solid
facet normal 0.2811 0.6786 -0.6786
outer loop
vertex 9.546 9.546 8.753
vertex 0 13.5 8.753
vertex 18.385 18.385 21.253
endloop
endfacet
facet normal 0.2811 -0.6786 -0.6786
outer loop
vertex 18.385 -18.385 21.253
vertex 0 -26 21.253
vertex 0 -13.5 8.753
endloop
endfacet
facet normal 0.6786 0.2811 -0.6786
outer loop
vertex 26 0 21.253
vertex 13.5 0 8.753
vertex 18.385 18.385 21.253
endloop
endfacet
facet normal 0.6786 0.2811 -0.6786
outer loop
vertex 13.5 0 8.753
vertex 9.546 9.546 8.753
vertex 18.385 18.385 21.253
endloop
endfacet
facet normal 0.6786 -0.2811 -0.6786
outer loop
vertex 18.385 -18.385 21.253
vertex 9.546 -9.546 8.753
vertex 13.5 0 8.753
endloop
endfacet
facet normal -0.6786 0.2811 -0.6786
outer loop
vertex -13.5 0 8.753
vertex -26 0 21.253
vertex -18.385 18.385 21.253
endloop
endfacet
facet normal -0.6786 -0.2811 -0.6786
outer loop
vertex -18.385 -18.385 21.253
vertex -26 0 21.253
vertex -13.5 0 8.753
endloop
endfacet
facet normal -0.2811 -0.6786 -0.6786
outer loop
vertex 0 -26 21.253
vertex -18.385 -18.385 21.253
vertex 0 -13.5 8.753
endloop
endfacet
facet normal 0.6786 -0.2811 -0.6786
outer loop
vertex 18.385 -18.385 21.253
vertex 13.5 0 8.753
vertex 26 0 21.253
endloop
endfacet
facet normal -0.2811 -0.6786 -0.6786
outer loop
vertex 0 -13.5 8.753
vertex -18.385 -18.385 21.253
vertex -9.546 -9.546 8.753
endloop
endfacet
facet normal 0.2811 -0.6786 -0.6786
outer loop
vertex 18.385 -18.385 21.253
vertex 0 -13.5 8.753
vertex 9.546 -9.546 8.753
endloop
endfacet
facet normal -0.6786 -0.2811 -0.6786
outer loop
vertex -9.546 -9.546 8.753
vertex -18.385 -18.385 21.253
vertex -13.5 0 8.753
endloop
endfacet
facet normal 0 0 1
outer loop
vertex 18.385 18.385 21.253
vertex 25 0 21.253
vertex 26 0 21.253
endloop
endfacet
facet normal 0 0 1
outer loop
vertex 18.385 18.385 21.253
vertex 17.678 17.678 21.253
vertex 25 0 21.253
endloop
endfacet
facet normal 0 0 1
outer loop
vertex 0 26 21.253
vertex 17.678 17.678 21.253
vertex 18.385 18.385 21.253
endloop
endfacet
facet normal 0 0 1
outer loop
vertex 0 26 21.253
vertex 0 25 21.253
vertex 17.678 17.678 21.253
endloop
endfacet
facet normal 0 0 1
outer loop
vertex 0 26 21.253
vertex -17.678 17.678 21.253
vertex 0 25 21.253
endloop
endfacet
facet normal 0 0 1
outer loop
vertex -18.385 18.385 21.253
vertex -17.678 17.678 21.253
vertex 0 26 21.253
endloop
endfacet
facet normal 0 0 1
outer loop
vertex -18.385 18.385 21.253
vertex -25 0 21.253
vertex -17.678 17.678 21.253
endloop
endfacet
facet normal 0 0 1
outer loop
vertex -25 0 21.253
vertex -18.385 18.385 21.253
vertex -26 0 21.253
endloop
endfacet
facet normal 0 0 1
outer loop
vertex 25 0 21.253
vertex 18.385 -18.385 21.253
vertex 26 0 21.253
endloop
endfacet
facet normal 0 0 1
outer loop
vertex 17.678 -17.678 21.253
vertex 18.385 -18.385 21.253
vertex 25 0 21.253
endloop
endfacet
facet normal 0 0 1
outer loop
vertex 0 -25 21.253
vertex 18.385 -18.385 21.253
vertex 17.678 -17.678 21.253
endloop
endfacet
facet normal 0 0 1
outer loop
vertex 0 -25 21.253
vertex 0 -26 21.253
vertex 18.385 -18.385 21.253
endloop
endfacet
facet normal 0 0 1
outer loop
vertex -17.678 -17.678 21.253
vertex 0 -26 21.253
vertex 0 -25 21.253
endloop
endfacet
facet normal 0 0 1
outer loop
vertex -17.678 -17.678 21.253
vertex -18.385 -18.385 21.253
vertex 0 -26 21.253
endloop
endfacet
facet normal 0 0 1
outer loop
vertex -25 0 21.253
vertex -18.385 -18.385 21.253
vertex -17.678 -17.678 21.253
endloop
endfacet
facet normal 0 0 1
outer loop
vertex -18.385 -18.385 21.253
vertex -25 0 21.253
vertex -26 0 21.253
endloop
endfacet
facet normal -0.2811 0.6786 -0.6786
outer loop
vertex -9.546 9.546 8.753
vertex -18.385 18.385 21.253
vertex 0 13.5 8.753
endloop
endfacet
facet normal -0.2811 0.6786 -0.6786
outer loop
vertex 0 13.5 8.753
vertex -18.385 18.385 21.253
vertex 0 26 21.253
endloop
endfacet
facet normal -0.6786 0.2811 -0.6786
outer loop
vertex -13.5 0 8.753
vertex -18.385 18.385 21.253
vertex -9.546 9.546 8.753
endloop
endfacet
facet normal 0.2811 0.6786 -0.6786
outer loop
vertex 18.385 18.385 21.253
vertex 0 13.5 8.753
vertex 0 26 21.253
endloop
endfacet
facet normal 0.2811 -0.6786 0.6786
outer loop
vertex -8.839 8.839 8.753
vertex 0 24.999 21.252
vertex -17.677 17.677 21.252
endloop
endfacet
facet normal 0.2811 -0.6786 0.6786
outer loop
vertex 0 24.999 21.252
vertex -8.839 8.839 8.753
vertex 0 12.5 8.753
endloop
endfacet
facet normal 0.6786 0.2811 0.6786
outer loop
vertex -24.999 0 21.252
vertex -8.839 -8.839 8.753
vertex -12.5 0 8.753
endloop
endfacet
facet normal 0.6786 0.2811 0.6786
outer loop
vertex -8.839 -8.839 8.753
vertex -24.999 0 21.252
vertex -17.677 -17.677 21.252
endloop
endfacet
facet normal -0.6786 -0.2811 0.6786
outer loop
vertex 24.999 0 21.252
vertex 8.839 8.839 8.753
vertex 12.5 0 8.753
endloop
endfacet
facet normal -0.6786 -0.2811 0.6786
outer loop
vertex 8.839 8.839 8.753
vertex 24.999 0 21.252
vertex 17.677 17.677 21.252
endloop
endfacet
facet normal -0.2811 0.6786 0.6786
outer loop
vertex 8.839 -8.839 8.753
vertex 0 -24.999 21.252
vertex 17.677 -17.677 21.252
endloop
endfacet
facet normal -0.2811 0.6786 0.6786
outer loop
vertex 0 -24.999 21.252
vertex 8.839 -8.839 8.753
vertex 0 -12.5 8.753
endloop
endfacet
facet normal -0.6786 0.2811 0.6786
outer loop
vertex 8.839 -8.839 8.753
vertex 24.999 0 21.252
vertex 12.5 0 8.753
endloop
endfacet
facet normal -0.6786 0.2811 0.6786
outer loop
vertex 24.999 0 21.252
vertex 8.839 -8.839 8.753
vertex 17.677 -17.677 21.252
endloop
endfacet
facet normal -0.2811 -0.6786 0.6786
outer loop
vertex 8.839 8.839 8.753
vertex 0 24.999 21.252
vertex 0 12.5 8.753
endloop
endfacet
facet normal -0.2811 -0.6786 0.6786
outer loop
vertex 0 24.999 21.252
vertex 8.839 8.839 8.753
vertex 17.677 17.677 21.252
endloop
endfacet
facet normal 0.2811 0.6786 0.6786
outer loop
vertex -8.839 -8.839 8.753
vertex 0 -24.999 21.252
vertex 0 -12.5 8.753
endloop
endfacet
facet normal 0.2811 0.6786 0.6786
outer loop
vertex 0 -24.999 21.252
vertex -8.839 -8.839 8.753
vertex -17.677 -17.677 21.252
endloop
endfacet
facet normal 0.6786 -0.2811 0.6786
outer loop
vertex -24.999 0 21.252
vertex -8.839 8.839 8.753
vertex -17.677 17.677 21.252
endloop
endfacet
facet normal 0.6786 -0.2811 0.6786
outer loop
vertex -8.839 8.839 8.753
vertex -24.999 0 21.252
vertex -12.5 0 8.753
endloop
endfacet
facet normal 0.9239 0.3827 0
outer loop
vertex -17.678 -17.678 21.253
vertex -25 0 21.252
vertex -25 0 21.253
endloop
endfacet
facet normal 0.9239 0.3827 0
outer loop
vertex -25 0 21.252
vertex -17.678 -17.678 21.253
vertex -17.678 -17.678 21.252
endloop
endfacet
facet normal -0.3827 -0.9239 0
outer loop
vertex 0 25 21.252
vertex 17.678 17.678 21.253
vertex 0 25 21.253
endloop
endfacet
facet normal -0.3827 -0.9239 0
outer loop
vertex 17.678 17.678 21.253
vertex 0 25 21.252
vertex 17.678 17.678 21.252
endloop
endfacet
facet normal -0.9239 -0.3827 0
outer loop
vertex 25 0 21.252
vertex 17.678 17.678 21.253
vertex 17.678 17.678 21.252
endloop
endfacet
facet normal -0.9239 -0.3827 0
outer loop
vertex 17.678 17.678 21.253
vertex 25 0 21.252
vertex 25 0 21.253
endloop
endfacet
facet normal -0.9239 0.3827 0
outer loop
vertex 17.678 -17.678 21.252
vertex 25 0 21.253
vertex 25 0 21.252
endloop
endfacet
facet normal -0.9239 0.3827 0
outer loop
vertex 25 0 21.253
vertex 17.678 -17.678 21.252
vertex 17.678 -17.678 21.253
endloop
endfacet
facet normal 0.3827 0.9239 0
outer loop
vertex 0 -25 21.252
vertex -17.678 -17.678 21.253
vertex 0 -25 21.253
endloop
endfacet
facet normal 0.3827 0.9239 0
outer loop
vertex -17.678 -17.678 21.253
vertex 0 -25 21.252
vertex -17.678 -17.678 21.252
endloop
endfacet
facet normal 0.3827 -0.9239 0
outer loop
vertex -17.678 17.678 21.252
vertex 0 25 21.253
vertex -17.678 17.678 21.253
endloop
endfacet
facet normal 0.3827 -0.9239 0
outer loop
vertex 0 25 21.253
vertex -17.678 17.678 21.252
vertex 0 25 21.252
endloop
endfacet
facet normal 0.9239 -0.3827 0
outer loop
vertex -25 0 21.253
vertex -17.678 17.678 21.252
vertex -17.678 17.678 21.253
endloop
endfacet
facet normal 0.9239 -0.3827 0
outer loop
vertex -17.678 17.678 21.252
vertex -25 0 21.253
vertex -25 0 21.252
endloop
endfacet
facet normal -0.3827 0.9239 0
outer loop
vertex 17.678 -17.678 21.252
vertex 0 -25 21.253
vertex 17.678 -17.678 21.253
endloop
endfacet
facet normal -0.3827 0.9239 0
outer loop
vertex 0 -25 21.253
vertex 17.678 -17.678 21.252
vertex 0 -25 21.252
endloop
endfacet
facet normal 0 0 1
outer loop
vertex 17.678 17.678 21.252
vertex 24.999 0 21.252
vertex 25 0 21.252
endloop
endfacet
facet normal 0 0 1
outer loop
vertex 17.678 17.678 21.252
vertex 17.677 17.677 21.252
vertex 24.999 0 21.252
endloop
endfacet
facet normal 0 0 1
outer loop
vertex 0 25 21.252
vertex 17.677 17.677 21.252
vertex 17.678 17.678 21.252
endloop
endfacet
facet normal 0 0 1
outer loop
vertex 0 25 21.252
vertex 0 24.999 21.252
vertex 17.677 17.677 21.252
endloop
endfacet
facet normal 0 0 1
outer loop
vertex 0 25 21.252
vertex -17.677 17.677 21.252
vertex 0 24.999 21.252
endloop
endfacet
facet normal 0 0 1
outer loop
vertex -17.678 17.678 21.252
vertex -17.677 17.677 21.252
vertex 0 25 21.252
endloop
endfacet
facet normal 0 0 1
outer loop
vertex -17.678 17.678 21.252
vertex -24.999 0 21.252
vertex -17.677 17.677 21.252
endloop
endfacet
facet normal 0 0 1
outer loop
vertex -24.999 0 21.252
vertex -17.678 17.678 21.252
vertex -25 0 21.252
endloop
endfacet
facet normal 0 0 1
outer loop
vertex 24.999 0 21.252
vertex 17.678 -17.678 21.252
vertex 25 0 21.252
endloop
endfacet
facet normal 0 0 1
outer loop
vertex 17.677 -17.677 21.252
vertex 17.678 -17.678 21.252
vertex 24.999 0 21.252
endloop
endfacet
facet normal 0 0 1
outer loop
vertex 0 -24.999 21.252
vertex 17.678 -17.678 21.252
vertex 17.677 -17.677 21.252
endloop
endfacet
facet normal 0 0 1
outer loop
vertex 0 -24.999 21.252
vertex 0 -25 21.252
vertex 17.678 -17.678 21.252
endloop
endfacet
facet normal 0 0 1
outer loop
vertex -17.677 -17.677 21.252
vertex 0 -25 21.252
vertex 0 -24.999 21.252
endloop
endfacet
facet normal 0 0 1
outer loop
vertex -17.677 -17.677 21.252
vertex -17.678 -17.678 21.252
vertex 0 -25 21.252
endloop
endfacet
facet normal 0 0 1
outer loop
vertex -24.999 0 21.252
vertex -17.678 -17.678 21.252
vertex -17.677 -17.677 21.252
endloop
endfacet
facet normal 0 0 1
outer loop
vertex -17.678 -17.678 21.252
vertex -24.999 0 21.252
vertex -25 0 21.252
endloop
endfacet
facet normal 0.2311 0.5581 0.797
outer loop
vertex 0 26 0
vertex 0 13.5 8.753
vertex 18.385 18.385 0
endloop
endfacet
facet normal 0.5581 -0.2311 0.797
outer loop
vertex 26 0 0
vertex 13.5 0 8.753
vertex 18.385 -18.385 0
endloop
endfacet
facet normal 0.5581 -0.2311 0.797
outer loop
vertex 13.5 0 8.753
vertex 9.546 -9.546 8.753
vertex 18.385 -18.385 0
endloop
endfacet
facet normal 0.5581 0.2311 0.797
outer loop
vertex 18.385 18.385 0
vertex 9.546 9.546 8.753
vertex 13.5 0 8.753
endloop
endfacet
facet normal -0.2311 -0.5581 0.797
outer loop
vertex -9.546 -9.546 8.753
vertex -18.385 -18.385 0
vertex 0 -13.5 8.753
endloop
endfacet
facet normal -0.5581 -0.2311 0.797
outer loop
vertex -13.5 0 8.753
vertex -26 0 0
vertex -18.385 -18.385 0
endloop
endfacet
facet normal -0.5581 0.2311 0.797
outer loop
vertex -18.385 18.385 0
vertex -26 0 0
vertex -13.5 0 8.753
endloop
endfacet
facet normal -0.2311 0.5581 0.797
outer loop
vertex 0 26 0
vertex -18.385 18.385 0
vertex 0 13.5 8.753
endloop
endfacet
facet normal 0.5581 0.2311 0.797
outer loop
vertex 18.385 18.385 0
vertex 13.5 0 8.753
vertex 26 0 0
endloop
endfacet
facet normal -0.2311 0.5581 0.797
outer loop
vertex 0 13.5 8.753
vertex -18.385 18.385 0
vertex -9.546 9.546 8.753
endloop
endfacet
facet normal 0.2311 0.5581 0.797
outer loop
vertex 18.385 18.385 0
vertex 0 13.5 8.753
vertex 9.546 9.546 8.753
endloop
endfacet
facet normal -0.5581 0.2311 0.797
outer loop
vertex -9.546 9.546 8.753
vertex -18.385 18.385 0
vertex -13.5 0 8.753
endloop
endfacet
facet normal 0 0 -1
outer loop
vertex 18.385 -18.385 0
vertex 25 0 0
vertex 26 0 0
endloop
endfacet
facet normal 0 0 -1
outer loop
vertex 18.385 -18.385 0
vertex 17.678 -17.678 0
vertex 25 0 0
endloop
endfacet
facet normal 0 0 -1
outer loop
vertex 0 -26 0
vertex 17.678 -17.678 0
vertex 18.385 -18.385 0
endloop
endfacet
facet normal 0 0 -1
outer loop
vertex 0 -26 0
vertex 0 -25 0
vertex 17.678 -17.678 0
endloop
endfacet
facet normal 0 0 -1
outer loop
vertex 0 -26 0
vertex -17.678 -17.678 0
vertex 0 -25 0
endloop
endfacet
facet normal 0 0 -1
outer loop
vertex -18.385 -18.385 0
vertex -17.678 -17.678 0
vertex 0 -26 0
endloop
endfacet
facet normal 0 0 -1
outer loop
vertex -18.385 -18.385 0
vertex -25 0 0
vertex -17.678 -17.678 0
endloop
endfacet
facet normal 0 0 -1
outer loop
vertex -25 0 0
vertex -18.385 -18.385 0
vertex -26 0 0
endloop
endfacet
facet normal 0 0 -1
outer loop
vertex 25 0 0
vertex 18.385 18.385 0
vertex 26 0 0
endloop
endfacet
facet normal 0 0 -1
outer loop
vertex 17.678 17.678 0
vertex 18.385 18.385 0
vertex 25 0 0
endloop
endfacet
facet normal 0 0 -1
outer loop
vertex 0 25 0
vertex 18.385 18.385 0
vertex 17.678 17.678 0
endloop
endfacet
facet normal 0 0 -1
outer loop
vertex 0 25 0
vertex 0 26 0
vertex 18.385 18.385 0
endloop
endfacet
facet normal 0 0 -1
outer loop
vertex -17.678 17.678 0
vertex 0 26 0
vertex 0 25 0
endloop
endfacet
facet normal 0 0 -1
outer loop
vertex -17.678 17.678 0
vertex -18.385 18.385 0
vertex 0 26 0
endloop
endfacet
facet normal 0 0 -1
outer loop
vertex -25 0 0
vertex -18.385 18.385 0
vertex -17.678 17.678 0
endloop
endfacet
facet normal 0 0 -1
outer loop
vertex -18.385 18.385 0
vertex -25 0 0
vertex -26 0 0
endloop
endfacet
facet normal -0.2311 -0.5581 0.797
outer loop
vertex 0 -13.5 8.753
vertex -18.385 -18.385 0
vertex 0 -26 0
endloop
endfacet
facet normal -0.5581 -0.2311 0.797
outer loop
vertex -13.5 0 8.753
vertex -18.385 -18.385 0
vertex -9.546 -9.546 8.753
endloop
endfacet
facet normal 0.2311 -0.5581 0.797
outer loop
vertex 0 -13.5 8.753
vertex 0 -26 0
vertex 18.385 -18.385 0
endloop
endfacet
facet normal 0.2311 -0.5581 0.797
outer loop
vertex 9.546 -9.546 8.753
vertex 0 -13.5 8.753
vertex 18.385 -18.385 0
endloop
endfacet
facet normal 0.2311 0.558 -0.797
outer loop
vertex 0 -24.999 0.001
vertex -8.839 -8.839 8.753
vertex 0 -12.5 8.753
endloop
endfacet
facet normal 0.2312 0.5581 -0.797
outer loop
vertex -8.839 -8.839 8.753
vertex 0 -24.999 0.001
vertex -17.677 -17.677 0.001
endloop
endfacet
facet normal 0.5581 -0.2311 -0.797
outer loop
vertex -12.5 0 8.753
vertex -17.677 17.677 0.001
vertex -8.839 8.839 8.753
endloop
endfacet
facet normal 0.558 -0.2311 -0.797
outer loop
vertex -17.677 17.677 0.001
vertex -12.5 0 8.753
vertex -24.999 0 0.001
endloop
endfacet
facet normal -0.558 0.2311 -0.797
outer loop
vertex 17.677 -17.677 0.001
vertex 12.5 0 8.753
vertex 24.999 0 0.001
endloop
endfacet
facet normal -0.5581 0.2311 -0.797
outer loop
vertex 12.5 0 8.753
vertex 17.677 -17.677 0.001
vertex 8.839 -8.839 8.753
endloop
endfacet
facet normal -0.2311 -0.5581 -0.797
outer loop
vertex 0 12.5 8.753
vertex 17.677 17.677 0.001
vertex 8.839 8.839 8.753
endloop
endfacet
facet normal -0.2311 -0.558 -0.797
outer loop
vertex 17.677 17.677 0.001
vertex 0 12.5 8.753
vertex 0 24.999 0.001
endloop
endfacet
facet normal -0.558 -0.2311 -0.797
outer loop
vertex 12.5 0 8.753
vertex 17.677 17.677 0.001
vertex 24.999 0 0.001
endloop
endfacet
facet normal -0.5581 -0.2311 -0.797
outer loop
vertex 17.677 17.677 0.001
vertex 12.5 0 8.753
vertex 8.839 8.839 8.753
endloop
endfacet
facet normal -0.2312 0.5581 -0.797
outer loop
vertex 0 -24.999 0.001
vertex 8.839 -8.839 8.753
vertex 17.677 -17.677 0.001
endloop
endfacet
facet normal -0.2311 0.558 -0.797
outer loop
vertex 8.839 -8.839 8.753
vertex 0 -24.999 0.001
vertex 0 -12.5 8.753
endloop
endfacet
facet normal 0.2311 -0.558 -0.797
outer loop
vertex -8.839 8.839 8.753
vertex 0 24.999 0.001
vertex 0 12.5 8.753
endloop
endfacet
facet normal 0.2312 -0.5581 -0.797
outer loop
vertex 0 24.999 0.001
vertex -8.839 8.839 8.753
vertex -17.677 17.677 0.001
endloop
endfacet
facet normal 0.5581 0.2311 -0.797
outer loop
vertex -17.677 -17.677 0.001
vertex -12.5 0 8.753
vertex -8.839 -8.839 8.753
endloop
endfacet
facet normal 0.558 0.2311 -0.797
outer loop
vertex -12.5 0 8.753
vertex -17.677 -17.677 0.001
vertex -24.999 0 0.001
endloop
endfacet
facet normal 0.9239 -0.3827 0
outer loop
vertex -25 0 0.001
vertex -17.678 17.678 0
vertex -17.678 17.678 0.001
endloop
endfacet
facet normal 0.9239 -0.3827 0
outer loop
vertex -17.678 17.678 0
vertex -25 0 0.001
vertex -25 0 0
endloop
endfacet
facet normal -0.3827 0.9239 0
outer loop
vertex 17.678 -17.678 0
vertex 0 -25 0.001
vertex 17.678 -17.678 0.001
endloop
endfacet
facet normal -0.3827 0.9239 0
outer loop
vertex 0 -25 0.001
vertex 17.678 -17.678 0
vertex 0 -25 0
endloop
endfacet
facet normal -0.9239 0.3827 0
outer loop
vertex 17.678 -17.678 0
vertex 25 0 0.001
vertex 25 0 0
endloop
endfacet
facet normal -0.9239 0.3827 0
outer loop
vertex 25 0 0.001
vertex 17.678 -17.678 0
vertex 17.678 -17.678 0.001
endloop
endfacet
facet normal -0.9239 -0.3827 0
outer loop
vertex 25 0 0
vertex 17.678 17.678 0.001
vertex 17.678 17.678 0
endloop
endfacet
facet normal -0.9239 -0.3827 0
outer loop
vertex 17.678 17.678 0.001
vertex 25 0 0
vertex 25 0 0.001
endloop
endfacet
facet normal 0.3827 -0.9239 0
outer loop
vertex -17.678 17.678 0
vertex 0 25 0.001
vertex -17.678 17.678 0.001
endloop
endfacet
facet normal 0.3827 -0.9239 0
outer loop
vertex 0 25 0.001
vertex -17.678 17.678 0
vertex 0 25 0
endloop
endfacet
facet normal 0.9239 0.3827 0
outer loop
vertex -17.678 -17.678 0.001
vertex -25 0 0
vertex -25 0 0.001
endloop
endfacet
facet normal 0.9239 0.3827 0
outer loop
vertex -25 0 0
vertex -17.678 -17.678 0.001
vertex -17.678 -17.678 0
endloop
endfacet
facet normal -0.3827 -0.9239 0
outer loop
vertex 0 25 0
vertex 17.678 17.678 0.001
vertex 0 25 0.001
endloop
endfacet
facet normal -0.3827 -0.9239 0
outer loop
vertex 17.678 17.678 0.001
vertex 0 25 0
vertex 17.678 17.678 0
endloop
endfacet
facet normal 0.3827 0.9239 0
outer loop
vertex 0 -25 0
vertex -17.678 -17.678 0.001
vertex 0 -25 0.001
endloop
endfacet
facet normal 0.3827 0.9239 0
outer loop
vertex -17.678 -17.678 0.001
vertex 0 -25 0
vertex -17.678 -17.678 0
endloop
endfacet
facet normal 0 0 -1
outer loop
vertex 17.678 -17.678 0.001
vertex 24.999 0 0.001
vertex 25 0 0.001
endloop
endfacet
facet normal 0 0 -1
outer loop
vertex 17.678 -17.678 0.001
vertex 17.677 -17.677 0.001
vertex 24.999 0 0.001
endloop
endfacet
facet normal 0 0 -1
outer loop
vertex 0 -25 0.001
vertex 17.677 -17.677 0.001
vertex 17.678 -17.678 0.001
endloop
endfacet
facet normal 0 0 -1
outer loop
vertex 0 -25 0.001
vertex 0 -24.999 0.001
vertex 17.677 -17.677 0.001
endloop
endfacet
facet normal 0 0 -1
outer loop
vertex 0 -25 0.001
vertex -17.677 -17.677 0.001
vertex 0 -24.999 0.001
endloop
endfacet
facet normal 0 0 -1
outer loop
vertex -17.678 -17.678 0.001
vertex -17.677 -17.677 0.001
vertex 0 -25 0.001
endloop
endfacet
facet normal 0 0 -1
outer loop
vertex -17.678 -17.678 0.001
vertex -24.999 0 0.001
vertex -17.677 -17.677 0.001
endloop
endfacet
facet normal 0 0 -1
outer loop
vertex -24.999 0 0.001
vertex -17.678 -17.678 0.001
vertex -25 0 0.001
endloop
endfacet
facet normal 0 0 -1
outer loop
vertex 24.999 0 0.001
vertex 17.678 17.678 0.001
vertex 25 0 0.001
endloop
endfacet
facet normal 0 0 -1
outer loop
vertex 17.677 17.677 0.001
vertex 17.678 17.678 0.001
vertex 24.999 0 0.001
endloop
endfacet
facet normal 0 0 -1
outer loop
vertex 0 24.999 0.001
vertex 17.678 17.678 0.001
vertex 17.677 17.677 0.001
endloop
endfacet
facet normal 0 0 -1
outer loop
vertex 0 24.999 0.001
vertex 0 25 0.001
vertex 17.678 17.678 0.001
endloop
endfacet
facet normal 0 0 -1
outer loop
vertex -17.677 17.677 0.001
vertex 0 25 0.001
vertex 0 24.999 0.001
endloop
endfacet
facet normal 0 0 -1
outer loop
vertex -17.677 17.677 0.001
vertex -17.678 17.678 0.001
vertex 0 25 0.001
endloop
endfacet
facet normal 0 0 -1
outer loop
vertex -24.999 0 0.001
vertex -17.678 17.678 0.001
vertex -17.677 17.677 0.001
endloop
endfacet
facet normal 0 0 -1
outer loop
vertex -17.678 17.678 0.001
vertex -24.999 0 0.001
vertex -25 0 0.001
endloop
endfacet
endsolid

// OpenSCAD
// file: Bendy.scad
thick_face = 0.001;

module draw_cone(R,r,h,thick_out,thick_in,thick_face,fn){
    difference(){
    cylinder(h=h, r1=r+thick_out, r2=R+thick_out, center=false, $fn=fn);
    cylinder(h=h, r1=r-thick_in, r2=R-thick_in, center=false, $fn=fn);
    translate([0,0,h-thick_face]) cylinder(h=thick_face*2, r1=R, r2=R, center=false, $fn=fn);
    translate([0,0,-thick_face]) cylinder(h=thick_out, r1=r, r2=r, center=false, $fn=fn);
    }
}

module draw_cell(R,r,h1,h2,thick_out,thick_in,thick_face,fn){
   translate([0,0,h2]) union(){
       //color([1, 0, 0]) 
       draw_cone(R,r,h1,thick_out,thick_in,thick_face,fn);
       //color([0, 0, 1])
       rotate([180,0,0])  draw_cone(R,r,h2,thick_out,thick_in,thick_face,fn);
   } 
}

module draw_tower(R,r,h1,h2,h_base,h_dist,n,fn,thick_out,thick_in){
    union(){
    // bottom base
    draw_cone(R,R,h_base,thick_out,thick_in,thick_face,fn);
    
    // cell    
    for(i=[0:1:n-1])
        translate([0,0,h_base + i*(h1+h2+h_dist)]) draw_cell(R,r,h1,h2,thick_out,thick_in,thick_face,fn);
    
    // cell connectors
    for(i=[1:n-1])
        translate([0,0,h_base + i*(h1+h2)+(i-1)*h_dist]) draw_cone(R,R,h_dist,thick_out,thick_in,thick_face,fn);
    
    // top base
    translate([0,0,h_base + n*(h1+h2)+(n-1)*h_dist]) draw_cone(R,R,h_base,thick_out,thick_in,thick_face, fn);
    }
}

//draw_cell(R,r,h1,h2,thick_out,thick_in,thick_face);
//for 
// main file
include <Bendy.scad>

// Input parameters
R = 25.0; // Radius
ratio = 0.5; // ratio between inner and outer radius
alpha1 = 45; // angle of top cone
alpha2 = 35; // angle of bottom cone

// number of cells
n = 1;

r = ratio*R;
h1 = (R-r)*tan(alpha1);
h2 = (R-r)*tan(alpha2);

// thickness = thick_out + thick_in
thick_out = 1.0;
thick_in = 0.0;

// optional parameters, 
h_base = 0.0; // extra cylinders on top and bottom of tower
h_dist = 0.0; // extra cylinders between cells

// circular approximation
// setting it to a large value (25, for example) creates
// a good circular approximation.
// setting it to a lower value (6 or 8, for example) creates
// something closer to the origami bendy tower
fn = 8;

// draw tower
draw_tower(R,r,h1,h2,h_base,h_dist,n,fn,thick_out,thick_in);

//$vpr = [90+alpha1, 0, 180/fn];
//$vpr = [90, 0, 180/fn];
//$vpr = [90, 0, 180/fn];
//$vpt = [0,0,h2];
//$vpd = 150;
